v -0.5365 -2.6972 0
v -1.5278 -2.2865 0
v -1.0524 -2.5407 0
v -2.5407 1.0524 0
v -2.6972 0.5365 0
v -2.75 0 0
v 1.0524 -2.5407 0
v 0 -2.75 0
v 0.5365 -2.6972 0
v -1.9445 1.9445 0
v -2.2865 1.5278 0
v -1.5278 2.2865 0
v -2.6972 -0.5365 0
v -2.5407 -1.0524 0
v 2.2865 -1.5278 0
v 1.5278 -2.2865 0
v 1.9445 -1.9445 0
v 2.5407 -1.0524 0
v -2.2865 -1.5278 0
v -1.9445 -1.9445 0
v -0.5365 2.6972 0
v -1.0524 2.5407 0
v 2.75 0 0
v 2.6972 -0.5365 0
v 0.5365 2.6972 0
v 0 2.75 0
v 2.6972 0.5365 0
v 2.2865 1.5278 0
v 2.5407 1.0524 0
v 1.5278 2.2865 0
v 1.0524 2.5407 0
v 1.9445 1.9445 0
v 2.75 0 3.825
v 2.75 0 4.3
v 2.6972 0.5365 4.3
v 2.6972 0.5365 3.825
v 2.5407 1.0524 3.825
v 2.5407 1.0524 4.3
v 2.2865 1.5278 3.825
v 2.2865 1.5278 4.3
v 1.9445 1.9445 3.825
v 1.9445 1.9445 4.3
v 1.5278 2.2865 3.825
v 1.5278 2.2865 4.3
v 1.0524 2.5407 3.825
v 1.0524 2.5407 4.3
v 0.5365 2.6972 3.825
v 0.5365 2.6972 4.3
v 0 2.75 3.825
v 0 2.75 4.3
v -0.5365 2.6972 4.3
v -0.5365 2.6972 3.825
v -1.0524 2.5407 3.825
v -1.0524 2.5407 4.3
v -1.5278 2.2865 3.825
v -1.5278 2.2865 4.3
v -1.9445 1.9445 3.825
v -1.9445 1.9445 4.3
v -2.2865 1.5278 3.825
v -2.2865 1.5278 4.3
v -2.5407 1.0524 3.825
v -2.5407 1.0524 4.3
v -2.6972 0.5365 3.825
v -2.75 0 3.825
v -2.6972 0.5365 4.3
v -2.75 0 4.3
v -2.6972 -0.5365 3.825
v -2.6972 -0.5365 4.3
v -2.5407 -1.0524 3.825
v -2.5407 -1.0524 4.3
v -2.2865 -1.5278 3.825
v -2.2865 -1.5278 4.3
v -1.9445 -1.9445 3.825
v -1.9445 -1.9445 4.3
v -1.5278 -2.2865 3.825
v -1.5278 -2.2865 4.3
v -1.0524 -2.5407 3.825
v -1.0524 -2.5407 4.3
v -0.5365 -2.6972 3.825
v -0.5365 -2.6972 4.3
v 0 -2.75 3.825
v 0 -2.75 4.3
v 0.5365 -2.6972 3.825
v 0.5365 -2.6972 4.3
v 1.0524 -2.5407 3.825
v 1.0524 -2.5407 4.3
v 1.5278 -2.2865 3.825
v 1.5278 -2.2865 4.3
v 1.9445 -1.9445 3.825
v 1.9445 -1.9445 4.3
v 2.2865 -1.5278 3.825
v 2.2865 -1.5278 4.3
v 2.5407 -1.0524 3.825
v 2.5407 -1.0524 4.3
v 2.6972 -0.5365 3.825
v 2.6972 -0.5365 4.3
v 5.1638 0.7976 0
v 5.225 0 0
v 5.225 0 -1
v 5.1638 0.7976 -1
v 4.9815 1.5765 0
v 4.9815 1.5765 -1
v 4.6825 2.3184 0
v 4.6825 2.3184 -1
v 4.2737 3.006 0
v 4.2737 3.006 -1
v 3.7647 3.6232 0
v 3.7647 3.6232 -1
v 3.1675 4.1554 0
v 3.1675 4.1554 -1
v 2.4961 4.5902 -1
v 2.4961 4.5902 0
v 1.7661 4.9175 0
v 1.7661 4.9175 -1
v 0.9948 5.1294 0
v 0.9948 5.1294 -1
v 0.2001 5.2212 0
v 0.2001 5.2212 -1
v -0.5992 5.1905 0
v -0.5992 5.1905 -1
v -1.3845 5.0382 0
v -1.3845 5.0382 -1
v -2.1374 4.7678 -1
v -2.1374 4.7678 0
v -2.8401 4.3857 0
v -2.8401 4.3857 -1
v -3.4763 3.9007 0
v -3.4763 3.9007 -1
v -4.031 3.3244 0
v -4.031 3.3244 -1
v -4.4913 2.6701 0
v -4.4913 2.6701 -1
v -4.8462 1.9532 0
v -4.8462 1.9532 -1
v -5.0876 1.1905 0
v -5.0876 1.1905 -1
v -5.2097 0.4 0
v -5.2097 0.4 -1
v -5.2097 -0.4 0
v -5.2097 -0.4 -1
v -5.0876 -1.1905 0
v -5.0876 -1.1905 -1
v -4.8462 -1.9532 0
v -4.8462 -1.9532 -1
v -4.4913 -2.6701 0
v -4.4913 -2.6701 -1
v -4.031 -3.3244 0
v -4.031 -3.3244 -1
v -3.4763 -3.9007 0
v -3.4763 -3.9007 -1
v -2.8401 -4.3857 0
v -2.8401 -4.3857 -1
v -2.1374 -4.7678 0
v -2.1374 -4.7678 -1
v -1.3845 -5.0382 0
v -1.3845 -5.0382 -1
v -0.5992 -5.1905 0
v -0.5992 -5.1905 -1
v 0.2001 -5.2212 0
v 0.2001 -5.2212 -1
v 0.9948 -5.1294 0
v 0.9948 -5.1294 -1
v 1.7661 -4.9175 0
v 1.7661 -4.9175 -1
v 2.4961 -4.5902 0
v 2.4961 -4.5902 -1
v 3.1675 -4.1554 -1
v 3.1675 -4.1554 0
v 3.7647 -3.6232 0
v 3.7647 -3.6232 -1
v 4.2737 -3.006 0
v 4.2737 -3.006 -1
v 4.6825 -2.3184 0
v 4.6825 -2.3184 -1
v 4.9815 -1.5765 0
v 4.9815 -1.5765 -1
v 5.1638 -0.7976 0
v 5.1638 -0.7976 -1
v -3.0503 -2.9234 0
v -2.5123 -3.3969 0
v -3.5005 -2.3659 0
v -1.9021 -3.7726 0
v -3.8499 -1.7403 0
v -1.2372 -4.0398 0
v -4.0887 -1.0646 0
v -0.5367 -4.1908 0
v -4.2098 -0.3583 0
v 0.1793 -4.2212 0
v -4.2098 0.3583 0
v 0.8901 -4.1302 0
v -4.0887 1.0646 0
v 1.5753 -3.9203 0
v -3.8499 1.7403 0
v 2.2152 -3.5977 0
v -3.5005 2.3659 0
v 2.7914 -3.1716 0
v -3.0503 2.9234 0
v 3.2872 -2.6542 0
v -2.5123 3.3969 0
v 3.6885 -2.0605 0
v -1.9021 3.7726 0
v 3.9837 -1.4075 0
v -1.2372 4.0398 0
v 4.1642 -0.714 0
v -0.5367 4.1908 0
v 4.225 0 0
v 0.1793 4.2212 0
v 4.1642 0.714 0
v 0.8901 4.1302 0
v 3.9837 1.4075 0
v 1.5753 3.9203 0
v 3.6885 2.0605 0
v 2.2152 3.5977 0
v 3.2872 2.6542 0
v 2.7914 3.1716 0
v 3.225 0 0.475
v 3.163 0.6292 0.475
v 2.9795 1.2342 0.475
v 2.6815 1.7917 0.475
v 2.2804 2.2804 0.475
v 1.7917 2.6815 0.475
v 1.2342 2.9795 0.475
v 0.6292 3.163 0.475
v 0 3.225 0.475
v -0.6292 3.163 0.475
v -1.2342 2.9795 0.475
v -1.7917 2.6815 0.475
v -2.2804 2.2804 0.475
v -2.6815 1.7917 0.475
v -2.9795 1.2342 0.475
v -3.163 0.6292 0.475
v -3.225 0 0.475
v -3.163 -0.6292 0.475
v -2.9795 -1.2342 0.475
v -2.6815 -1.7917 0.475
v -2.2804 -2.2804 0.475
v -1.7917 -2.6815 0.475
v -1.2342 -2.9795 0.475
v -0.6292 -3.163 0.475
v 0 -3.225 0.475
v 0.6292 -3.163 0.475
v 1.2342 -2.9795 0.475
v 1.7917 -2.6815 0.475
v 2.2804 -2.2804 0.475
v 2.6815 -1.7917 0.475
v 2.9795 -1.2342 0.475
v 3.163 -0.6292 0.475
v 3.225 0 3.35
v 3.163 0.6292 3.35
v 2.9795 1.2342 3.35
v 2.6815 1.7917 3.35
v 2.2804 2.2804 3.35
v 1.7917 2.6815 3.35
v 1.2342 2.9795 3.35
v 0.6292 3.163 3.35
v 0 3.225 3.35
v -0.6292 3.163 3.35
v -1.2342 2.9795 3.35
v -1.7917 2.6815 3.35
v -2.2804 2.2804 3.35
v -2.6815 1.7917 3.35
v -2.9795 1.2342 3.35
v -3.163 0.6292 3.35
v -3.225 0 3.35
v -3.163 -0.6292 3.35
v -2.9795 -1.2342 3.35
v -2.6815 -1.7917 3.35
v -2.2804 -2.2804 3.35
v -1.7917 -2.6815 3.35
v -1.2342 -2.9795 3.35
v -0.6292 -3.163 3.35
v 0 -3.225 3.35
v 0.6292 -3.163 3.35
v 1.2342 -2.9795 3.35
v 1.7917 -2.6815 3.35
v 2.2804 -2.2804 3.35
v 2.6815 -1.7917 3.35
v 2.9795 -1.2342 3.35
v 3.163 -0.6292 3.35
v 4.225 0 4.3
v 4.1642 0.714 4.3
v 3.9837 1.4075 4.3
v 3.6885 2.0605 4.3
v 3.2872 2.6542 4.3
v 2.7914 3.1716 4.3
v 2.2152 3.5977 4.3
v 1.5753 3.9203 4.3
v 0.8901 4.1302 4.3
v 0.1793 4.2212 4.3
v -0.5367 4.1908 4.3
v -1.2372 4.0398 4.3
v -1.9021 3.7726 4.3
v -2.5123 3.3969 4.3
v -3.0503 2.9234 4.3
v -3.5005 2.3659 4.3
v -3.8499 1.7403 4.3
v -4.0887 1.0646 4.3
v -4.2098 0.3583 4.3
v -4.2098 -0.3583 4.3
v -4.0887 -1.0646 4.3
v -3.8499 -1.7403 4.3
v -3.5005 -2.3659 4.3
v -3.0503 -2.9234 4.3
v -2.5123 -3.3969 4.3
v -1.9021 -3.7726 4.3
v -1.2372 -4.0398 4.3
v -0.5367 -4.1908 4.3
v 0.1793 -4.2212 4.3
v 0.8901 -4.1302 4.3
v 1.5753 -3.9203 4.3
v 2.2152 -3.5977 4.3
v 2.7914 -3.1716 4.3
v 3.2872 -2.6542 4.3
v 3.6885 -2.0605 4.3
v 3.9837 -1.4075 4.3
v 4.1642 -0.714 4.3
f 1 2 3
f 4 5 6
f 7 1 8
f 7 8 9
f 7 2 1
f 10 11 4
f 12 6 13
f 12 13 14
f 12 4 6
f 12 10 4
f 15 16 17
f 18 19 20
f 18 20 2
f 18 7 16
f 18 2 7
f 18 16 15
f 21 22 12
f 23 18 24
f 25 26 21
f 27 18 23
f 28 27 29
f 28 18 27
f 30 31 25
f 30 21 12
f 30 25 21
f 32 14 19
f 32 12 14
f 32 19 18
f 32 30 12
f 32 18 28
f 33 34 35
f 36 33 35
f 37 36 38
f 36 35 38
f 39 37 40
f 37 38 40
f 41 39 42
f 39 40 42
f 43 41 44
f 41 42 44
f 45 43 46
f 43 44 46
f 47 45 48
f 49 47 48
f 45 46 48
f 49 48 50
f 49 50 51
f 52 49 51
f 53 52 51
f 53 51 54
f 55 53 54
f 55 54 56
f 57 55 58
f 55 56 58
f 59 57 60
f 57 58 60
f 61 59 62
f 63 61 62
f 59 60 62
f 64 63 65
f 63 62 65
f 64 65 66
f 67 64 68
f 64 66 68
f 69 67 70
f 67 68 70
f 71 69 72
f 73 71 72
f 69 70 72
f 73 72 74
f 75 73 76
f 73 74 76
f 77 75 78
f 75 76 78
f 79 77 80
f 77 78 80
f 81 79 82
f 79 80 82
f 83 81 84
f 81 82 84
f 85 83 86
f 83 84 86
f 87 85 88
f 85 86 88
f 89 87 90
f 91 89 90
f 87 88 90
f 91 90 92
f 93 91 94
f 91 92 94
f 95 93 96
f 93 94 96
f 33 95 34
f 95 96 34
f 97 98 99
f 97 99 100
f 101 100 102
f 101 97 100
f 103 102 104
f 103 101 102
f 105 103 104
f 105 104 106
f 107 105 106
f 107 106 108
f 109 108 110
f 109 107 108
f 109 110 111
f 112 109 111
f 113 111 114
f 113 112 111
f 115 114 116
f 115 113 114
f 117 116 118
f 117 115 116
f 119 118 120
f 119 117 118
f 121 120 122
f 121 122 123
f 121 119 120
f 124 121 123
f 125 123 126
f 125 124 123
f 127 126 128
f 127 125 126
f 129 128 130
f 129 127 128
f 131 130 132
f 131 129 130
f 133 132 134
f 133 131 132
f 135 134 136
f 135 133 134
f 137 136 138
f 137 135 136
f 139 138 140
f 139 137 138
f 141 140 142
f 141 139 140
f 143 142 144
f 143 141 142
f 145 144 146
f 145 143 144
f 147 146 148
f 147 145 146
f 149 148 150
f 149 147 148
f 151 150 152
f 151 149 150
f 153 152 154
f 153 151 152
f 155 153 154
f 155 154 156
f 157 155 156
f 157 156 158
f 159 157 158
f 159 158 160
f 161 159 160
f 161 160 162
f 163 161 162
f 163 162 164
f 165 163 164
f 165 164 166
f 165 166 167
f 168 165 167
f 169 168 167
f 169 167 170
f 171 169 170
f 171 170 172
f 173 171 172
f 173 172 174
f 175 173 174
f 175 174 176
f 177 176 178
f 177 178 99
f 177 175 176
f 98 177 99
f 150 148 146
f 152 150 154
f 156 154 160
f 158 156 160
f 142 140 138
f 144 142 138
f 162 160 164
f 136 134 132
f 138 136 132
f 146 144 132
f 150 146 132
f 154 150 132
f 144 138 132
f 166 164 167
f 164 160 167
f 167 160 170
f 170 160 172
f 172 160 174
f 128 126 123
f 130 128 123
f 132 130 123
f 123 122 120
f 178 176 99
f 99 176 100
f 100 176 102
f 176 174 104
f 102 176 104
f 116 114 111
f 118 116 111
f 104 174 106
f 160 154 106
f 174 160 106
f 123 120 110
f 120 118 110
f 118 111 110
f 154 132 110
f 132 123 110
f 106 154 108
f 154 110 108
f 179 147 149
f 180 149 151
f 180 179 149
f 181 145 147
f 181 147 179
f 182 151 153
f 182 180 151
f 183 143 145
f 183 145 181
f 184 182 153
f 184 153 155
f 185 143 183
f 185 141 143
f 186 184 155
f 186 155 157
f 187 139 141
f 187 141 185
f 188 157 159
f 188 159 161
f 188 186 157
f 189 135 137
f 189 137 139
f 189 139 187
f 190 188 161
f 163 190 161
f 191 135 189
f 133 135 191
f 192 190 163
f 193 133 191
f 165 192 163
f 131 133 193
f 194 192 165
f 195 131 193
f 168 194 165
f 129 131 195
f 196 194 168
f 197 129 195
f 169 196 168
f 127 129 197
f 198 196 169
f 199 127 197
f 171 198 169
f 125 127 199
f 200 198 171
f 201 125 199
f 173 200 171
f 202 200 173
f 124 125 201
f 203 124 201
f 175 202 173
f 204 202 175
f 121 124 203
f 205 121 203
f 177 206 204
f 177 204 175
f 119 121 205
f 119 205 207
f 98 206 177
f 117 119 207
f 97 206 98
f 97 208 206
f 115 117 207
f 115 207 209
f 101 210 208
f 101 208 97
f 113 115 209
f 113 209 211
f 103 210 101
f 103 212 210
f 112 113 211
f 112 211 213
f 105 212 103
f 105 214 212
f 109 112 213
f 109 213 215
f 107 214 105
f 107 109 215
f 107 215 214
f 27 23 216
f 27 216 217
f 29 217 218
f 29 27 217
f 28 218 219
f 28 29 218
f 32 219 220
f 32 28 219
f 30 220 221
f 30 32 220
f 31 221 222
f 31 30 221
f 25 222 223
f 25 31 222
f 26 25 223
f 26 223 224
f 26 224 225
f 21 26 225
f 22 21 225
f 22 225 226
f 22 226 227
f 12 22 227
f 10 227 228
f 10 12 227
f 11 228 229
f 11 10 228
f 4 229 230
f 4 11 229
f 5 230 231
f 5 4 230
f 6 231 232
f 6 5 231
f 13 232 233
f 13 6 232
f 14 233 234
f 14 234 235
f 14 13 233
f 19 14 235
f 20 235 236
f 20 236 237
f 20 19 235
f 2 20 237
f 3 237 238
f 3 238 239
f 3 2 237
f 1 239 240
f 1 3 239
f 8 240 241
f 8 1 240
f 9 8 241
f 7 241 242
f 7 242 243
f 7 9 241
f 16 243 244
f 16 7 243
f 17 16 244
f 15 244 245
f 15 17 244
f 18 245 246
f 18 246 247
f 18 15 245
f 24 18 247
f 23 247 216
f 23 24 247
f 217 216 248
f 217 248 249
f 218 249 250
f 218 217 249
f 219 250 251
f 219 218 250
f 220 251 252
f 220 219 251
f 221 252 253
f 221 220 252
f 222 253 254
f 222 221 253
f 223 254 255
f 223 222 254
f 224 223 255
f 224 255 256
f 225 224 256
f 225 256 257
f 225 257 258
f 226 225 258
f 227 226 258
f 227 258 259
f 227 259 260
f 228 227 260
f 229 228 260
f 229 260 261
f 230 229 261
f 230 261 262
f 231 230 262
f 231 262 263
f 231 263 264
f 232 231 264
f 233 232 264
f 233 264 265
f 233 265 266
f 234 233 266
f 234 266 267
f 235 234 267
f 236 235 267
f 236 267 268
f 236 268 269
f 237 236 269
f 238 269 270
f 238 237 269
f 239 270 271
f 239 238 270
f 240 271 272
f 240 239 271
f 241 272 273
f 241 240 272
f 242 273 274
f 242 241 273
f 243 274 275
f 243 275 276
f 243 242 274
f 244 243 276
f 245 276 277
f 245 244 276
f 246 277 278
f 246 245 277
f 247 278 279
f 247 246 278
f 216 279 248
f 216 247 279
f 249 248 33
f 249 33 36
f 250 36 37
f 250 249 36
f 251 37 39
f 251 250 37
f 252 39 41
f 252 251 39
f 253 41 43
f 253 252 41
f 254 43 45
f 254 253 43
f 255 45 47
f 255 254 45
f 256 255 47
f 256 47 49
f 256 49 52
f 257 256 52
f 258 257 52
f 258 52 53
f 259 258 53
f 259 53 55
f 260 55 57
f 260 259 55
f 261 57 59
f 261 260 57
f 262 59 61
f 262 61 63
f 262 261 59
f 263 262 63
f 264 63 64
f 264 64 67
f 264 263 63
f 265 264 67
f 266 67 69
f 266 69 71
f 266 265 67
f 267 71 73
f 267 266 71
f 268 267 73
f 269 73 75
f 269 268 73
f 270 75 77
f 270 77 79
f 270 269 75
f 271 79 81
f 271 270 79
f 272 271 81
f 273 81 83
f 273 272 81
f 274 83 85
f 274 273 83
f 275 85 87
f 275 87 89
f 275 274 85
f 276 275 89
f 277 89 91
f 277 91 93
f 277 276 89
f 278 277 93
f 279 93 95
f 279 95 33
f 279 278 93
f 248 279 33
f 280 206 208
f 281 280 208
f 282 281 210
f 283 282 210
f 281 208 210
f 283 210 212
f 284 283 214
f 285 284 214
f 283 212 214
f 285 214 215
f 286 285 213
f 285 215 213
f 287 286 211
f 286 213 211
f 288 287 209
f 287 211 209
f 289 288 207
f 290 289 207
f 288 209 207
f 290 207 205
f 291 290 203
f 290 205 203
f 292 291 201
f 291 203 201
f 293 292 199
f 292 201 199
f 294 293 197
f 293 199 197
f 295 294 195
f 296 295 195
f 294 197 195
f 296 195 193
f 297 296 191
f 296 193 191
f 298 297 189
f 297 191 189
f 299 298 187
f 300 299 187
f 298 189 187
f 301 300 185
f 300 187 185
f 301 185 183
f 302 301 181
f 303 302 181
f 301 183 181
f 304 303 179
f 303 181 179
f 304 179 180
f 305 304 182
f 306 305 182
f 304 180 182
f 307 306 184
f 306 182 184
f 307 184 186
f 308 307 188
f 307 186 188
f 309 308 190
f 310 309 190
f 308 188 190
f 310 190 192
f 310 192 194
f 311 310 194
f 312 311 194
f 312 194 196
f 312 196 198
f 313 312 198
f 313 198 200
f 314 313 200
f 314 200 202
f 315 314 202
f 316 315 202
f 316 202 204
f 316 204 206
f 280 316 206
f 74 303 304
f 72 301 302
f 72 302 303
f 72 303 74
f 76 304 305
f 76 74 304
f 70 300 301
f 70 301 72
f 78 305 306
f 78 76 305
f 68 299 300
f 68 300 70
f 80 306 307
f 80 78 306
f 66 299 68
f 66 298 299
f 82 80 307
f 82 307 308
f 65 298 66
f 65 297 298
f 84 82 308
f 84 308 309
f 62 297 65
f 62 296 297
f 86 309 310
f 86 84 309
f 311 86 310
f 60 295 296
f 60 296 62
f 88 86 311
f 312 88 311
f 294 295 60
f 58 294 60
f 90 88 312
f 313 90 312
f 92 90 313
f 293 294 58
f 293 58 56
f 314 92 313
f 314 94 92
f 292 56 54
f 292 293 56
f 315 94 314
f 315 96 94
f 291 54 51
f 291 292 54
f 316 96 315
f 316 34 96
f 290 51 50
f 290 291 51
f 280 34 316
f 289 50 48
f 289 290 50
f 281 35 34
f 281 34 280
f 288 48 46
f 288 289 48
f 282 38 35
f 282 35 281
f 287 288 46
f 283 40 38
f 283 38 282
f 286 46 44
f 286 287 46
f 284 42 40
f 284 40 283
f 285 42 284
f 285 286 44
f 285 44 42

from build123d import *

# Parameters (mm, degrees)
F6_R      = 5.225
F7_DEPTH  = 1
F5_R      = 4.225
F5_R_2    = 3.225
F8_DEPTH  = 4.3
F9_R      = 3.225
F9_R_2    = 2.75
F10_DEPTH = 0.95
F11_SIZE  = 0.47499
F12_SIZE  = 0.475


# Not quite as in the source:
# - a fillet or chamfer is up to 0.001 mm smaller than in the source, because OpenCascade refuses the exact size


with BuildPart() as f7:
    # F6 (on face) → F7 (new body)
    with BuildSketch(Plane.XY):
        Circle(F6_R)
    extrude(amount=-F7_DEPTH)



with BuildPart() as f7b:
    # F5 (on Top) → F7, piece 2 (new body)
    with BuildSketch(Plane.XY):
        Circle(F5_R)
        Circle(F5_R_2, mode=Mode.SUBTRACT)
    extrude(amount=-F7_DEPTH)


with BuildPart() as f7_1:
    add(f7.part)

    add(f7b.part)  # F8 merges F7b
    # F5 (on Top) → F8 (join)
    with BuildSketch(Plane.XY):
        Circle(F5_R)
        Circle(F5_R_2, mode=Mode.SUBTRACT)
    extrude(amount=F8_DEPTH)

    # F9 (on face) → F10 (join)
    with BuildSketch(Plane.XY.offset(4.3)):
        Circle(F9_R)
        Circle(F9_R_2, mode=Mode.SUBTRACT)
    extrude(amount=-F10_DEPTH)

    # F11 (size 0.475 in the source; OpenCascade refuses exactly that, so slightly less here)
    f11_edges = [f7_1.edges().sort_by_distance(p)[0] for p in [
        (-2.75, 0, 3.35),
    ]]
    chamfer(f11_edges, length=F11_SIZE)

    # F12
    f12_edges = [f7_1.edges().sort_by_distance(p)[0] for p in [
        (-3.225, 0, 0),
    ]]
    chamfer(f12_edges, length=F12_SIZE)


solid = f7_1.part
